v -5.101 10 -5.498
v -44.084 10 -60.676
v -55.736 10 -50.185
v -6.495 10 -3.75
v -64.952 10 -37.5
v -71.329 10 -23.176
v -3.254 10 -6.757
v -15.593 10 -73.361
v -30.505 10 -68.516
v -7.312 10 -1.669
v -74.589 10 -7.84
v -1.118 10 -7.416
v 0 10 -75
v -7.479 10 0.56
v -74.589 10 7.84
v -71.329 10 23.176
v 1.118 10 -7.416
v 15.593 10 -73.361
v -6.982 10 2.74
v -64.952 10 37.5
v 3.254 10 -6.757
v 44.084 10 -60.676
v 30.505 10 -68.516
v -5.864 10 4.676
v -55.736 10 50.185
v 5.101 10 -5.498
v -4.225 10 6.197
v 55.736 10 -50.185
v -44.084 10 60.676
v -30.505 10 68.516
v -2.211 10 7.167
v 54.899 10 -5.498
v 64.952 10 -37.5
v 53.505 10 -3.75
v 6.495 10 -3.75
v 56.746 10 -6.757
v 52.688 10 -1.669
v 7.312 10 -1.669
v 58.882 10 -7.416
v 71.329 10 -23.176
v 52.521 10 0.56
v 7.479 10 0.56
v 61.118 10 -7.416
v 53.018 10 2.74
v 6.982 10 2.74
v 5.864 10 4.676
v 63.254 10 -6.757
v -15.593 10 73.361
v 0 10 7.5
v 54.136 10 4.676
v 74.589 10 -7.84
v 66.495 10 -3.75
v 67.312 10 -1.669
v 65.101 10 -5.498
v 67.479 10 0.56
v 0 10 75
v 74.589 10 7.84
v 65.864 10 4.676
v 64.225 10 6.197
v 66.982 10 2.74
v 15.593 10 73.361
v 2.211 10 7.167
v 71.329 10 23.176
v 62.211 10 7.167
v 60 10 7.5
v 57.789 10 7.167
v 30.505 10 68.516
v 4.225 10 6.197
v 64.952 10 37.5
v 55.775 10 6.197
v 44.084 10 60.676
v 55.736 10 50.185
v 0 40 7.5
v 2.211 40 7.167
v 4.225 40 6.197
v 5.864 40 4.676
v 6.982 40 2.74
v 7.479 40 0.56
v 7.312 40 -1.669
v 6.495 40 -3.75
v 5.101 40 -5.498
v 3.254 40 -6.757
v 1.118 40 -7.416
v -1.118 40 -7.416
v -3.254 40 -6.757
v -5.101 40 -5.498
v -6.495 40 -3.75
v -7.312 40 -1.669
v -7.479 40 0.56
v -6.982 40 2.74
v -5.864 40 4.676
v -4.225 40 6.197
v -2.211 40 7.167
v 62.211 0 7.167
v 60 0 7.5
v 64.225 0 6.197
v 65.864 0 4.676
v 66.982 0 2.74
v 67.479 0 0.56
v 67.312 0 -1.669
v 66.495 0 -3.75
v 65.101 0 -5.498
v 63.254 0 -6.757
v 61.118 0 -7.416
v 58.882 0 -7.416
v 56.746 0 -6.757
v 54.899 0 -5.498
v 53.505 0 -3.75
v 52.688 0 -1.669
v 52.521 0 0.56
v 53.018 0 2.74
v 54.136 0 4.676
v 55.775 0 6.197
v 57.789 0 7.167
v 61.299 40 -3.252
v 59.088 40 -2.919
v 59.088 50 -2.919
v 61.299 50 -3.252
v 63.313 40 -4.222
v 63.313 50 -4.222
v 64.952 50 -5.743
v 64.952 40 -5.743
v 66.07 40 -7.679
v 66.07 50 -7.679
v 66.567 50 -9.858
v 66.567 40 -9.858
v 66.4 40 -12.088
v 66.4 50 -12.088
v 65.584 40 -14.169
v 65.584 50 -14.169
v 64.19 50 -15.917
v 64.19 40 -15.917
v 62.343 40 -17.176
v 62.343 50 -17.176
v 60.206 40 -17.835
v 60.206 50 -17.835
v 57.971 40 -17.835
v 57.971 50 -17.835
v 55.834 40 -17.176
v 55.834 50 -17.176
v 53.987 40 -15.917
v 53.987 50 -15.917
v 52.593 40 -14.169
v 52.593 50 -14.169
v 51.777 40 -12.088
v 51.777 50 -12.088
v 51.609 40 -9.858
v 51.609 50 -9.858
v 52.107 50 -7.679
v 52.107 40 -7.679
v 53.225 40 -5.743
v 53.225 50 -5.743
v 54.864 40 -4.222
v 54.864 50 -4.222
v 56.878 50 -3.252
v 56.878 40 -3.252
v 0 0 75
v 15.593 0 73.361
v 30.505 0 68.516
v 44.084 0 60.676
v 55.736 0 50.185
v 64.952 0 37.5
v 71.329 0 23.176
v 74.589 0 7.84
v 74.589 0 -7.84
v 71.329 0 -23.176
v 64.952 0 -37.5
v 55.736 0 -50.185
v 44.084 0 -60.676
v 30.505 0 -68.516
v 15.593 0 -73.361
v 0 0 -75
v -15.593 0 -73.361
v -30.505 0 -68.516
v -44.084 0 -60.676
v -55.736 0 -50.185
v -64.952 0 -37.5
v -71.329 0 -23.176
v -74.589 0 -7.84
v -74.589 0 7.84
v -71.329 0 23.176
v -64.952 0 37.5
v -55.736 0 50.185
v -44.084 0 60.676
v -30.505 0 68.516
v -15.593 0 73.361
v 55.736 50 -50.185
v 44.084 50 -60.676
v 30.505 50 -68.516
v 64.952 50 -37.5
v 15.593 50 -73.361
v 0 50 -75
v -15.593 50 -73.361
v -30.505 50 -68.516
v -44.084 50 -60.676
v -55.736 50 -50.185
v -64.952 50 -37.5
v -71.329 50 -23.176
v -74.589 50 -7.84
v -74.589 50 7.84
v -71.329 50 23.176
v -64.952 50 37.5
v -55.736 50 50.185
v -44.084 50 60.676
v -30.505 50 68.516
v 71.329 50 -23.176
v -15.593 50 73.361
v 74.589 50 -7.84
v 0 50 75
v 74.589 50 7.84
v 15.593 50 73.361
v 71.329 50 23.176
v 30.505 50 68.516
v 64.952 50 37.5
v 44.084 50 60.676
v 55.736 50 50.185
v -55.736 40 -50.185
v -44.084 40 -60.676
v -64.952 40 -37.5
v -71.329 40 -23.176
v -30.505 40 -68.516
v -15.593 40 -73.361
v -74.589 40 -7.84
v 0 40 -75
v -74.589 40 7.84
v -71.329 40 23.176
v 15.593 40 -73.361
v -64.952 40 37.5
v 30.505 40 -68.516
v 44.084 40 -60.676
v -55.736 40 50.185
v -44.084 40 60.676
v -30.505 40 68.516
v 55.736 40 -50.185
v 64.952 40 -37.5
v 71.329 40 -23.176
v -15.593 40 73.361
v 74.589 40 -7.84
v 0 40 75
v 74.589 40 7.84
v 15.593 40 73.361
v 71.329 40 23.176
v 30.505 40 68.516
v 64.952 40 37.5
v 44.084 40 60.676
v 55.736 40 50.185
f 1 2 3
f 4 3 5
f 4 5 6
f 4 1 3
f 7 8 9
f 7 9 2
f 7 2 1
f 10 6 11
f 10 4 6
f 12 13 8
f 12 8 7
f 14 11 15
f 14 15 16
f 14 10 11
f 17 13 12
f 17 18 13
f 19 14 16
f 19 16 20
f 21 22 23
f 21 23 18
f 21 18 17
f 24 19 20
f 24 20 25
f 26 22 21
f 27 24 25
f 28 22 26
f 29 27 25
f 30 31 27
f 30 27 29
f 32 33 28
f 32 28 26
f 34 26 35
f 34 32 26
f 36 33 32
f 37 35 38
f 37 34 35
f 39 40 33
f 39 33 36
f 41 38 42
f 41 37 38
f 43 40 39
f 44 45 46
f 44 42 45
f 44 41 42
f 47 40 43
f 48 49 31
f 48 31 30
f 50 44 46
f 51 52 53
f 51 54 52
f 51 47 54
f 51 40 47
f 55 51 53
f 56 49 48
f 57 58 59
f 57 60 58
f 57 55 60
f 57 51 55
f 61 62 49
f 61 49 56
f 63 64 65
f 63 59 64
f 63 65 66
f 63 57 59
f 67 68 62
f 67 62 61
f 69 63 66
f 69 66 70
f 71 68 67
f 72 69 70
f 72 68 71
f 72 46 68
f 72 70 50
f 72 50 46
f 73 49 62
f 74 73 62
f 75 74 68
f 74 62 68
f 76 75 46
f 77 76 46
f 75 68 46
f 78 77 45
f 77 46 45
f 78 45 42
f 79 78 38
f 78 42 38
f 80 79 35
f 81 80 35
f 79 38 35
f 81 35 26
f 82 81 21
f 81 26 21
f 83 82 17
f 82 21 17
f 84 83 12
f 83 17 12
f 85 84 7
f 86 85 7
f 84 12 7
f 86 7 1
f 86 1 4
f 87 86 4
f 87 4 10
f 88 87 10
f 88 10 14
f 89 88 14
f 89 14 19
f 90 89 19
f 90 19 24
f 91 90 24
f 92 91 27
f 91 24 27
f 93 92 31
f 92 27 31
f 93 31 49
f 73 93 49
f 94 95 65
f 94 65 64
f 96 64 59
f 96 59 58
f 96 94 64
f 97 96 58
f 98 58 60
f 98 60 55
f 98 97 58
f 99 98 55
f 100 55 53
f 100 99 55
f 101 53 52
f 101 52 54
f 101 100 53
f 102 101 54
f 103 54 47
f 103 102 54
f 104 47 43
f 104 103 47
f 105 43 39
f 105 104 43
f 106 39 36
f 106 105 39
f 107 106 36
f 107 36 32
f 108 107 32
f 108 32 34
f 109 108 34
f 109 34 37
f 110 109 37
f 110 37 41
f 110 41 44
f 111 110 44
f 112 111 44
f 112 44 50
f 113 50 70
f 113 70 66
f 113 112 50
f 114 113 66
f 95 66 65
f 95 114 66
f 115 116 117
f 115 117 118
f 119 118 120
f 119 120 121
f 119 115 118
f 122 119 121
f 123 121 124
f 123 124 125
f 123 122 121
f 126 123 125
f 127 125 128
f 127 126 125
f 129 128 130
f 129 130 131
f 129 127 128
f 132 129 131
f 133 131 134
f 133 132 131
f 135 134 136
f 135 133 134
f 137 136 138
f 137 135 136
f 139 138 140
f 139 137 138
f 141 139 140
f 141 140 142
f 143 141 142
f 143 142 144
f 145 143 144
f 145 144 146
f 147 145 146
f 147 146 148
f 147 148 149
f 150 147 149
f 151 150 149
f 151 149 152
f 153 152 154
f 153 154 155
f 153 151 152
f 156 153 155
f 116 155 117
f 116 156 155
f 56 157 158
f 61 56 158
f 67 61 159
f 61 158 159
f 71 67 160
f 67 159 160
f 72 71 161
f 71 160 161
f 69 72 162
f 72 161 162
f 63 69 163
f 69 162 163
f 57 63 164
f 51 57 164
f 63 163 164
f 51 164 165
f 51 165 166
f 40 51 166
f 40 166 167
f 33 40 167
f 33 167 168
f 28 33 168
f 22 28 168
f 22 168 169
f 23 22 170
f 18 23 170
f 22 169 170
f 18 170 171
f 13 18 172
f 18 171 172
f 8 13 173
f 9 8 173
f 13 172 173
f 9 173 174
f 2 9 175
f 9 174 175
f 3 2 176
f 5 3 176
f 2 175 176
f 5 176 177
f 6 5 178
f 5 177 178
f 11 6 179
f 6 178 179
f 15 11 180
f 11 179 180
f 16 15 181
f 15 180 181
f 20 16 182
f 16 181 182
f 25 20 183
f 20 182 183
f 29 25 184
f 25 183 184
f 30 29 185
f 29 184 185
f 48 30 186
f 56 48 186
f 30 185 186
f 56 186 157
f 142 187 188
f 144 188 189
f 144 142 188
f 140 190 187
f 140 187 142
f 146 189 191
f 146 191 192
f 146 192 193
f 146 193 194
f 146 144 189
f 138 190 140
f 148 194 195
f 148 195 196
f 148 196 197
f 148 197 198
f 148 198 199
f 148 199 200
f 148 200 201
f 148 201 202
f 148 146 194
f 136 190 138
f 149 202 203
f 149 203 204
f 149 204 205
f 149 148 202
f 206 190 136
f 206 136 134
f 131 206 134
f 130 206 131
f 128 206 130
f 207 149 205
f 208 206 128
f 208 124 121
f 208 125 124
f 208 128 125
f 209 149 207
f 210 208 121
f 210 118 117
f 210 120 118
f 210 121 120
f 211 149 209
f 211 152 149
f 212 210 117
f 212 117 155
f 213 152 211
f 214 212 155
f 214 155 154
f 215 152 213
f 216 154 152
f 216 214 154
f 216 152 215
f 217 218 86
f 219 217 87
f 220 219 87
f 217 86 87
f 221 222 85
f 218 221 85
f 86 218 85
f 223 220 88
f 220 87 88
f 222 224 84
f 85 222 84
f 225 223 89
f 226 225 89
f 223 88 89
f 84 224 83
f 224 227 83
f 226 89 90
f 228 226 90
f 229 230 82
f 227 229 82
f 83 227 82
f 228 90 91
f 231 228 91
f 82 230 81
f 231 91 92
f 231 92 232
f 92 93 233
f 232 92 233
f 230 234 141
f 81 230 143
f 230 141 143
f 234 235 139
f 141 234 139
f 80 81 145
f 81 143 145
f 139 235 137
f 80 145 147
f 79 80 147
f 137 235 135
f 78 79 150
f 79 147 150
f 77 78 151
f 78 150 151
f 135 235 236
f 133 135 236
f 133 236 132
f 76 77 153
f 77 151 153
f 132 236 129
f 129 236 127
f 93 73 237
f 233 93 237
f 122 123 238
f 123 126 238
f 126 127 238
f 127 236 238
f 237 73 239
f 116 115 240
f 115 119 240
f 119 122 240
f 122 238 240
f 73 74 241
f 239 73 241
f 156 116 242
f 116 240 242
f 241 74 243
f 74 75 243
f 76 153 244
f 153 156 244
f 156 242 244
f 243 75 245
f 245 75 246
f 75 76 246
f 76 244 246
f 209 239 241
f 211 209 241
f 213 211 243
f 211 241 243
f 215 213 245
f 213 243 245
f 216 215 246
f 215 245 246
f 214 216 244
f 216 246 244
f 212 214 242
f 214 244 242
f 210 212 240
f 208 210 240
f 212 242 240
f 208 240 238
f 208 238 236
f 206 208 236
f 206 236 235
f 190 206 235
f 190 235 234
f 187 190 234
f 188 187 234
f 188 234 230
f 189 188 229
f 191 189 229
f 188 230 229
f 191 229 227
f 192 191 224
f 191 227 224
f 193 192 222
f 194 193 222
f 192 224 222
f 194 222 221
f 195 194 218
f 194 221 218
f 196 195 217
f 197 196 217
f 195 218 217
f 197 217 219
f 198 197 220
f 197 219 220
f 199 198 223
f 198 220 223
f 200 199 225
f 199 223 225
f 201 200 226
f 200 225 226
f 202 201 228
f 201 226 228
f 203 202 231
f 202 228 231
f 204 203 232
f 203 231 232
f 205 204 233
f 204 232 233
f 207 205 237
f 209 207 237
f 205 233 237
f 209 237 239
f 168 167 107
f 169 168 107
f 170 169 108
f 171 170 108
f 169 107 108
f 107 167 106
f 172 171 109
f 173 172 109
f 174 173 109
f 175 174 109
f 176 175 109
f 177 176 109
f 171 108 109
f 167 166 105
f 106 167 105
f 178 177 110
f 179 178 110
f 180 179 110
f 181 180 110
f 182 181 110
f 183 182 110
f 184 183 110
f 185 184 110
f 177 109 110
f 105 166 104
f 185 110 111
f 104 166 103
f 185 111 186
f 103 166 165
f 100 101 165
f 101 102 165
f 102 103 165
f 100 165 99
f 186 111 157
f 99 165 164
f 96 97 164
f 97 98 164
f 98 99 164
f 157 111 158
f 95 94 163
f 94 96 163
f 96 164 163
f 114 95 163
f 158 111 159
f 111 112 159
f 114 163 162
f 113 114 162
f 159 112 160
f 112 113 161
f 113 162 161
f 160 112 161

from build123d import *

# Parameters (mm, degrees)
SKETCH1_R           = 75
SKETCH1_R_2         = 7.5
BOSS_EXTRUDE1_DEPTH = 10
SKETCH2_R           = 7.5
BOSS_EXTRUDE2_DEPTH = 30
SKETCH3_R           = 75
SKETCH3_R_2         = 7.5
BOSS_EXTRUDE5_DEPTH = 10


with BuildPart() as part:
    # Sketch1 → Boss-Extrude1 (new body)
    with BuildSketch(Plane(origin=(0, 0, 0), x_dir=(1, 0, 0), z_dir=(0, 1, 0))):
        with Locations(Location((0, 0, 0), (0, 0, 270))):
            Circle(SKETCH1_R)
        with Locations(Location((60, 0, 0), (0, 0, 270))):
            Circle(SKETCH1_R_2, mode=Mode.SUBTRACT)
    extrude(amount=BOSS_EXTRUDE1_DEPTH)

    # Sketch2 → Boss-Extrude2 (add)
    with BuildSketch(Plane(origin=(0, 10, 0), x_dir=(1, 0, 0), z_dir=(0, 1, 0))):
        with Locations(Location((0, 0, 0), (0, 0, 270))):
            Circle(SKETCH2_R)
    extrude(amount=BOSS_EXTRUDE2_DEPTH)

    # Sketch3 → Boss-Extrude5 (add)
    with BuildSketch(Plane(origin=(0, 40, 0), x_dir=(1, 0, 0), z_dir=(0, 1, 0))):
        with Locations(Location((0, 0, 0), (0, 0, 270))):
            Circle(SKETCH3_R)
        with Locations(Location((59.088465181, 10.41889066, 0), (0, 0, 270))):
            Circle(SKETCH3_R_2, mode=Mode.SUBTRACT)
    extrude(amount=BOSS_EXTRUDE5_DEPTH)


solid = part.part
